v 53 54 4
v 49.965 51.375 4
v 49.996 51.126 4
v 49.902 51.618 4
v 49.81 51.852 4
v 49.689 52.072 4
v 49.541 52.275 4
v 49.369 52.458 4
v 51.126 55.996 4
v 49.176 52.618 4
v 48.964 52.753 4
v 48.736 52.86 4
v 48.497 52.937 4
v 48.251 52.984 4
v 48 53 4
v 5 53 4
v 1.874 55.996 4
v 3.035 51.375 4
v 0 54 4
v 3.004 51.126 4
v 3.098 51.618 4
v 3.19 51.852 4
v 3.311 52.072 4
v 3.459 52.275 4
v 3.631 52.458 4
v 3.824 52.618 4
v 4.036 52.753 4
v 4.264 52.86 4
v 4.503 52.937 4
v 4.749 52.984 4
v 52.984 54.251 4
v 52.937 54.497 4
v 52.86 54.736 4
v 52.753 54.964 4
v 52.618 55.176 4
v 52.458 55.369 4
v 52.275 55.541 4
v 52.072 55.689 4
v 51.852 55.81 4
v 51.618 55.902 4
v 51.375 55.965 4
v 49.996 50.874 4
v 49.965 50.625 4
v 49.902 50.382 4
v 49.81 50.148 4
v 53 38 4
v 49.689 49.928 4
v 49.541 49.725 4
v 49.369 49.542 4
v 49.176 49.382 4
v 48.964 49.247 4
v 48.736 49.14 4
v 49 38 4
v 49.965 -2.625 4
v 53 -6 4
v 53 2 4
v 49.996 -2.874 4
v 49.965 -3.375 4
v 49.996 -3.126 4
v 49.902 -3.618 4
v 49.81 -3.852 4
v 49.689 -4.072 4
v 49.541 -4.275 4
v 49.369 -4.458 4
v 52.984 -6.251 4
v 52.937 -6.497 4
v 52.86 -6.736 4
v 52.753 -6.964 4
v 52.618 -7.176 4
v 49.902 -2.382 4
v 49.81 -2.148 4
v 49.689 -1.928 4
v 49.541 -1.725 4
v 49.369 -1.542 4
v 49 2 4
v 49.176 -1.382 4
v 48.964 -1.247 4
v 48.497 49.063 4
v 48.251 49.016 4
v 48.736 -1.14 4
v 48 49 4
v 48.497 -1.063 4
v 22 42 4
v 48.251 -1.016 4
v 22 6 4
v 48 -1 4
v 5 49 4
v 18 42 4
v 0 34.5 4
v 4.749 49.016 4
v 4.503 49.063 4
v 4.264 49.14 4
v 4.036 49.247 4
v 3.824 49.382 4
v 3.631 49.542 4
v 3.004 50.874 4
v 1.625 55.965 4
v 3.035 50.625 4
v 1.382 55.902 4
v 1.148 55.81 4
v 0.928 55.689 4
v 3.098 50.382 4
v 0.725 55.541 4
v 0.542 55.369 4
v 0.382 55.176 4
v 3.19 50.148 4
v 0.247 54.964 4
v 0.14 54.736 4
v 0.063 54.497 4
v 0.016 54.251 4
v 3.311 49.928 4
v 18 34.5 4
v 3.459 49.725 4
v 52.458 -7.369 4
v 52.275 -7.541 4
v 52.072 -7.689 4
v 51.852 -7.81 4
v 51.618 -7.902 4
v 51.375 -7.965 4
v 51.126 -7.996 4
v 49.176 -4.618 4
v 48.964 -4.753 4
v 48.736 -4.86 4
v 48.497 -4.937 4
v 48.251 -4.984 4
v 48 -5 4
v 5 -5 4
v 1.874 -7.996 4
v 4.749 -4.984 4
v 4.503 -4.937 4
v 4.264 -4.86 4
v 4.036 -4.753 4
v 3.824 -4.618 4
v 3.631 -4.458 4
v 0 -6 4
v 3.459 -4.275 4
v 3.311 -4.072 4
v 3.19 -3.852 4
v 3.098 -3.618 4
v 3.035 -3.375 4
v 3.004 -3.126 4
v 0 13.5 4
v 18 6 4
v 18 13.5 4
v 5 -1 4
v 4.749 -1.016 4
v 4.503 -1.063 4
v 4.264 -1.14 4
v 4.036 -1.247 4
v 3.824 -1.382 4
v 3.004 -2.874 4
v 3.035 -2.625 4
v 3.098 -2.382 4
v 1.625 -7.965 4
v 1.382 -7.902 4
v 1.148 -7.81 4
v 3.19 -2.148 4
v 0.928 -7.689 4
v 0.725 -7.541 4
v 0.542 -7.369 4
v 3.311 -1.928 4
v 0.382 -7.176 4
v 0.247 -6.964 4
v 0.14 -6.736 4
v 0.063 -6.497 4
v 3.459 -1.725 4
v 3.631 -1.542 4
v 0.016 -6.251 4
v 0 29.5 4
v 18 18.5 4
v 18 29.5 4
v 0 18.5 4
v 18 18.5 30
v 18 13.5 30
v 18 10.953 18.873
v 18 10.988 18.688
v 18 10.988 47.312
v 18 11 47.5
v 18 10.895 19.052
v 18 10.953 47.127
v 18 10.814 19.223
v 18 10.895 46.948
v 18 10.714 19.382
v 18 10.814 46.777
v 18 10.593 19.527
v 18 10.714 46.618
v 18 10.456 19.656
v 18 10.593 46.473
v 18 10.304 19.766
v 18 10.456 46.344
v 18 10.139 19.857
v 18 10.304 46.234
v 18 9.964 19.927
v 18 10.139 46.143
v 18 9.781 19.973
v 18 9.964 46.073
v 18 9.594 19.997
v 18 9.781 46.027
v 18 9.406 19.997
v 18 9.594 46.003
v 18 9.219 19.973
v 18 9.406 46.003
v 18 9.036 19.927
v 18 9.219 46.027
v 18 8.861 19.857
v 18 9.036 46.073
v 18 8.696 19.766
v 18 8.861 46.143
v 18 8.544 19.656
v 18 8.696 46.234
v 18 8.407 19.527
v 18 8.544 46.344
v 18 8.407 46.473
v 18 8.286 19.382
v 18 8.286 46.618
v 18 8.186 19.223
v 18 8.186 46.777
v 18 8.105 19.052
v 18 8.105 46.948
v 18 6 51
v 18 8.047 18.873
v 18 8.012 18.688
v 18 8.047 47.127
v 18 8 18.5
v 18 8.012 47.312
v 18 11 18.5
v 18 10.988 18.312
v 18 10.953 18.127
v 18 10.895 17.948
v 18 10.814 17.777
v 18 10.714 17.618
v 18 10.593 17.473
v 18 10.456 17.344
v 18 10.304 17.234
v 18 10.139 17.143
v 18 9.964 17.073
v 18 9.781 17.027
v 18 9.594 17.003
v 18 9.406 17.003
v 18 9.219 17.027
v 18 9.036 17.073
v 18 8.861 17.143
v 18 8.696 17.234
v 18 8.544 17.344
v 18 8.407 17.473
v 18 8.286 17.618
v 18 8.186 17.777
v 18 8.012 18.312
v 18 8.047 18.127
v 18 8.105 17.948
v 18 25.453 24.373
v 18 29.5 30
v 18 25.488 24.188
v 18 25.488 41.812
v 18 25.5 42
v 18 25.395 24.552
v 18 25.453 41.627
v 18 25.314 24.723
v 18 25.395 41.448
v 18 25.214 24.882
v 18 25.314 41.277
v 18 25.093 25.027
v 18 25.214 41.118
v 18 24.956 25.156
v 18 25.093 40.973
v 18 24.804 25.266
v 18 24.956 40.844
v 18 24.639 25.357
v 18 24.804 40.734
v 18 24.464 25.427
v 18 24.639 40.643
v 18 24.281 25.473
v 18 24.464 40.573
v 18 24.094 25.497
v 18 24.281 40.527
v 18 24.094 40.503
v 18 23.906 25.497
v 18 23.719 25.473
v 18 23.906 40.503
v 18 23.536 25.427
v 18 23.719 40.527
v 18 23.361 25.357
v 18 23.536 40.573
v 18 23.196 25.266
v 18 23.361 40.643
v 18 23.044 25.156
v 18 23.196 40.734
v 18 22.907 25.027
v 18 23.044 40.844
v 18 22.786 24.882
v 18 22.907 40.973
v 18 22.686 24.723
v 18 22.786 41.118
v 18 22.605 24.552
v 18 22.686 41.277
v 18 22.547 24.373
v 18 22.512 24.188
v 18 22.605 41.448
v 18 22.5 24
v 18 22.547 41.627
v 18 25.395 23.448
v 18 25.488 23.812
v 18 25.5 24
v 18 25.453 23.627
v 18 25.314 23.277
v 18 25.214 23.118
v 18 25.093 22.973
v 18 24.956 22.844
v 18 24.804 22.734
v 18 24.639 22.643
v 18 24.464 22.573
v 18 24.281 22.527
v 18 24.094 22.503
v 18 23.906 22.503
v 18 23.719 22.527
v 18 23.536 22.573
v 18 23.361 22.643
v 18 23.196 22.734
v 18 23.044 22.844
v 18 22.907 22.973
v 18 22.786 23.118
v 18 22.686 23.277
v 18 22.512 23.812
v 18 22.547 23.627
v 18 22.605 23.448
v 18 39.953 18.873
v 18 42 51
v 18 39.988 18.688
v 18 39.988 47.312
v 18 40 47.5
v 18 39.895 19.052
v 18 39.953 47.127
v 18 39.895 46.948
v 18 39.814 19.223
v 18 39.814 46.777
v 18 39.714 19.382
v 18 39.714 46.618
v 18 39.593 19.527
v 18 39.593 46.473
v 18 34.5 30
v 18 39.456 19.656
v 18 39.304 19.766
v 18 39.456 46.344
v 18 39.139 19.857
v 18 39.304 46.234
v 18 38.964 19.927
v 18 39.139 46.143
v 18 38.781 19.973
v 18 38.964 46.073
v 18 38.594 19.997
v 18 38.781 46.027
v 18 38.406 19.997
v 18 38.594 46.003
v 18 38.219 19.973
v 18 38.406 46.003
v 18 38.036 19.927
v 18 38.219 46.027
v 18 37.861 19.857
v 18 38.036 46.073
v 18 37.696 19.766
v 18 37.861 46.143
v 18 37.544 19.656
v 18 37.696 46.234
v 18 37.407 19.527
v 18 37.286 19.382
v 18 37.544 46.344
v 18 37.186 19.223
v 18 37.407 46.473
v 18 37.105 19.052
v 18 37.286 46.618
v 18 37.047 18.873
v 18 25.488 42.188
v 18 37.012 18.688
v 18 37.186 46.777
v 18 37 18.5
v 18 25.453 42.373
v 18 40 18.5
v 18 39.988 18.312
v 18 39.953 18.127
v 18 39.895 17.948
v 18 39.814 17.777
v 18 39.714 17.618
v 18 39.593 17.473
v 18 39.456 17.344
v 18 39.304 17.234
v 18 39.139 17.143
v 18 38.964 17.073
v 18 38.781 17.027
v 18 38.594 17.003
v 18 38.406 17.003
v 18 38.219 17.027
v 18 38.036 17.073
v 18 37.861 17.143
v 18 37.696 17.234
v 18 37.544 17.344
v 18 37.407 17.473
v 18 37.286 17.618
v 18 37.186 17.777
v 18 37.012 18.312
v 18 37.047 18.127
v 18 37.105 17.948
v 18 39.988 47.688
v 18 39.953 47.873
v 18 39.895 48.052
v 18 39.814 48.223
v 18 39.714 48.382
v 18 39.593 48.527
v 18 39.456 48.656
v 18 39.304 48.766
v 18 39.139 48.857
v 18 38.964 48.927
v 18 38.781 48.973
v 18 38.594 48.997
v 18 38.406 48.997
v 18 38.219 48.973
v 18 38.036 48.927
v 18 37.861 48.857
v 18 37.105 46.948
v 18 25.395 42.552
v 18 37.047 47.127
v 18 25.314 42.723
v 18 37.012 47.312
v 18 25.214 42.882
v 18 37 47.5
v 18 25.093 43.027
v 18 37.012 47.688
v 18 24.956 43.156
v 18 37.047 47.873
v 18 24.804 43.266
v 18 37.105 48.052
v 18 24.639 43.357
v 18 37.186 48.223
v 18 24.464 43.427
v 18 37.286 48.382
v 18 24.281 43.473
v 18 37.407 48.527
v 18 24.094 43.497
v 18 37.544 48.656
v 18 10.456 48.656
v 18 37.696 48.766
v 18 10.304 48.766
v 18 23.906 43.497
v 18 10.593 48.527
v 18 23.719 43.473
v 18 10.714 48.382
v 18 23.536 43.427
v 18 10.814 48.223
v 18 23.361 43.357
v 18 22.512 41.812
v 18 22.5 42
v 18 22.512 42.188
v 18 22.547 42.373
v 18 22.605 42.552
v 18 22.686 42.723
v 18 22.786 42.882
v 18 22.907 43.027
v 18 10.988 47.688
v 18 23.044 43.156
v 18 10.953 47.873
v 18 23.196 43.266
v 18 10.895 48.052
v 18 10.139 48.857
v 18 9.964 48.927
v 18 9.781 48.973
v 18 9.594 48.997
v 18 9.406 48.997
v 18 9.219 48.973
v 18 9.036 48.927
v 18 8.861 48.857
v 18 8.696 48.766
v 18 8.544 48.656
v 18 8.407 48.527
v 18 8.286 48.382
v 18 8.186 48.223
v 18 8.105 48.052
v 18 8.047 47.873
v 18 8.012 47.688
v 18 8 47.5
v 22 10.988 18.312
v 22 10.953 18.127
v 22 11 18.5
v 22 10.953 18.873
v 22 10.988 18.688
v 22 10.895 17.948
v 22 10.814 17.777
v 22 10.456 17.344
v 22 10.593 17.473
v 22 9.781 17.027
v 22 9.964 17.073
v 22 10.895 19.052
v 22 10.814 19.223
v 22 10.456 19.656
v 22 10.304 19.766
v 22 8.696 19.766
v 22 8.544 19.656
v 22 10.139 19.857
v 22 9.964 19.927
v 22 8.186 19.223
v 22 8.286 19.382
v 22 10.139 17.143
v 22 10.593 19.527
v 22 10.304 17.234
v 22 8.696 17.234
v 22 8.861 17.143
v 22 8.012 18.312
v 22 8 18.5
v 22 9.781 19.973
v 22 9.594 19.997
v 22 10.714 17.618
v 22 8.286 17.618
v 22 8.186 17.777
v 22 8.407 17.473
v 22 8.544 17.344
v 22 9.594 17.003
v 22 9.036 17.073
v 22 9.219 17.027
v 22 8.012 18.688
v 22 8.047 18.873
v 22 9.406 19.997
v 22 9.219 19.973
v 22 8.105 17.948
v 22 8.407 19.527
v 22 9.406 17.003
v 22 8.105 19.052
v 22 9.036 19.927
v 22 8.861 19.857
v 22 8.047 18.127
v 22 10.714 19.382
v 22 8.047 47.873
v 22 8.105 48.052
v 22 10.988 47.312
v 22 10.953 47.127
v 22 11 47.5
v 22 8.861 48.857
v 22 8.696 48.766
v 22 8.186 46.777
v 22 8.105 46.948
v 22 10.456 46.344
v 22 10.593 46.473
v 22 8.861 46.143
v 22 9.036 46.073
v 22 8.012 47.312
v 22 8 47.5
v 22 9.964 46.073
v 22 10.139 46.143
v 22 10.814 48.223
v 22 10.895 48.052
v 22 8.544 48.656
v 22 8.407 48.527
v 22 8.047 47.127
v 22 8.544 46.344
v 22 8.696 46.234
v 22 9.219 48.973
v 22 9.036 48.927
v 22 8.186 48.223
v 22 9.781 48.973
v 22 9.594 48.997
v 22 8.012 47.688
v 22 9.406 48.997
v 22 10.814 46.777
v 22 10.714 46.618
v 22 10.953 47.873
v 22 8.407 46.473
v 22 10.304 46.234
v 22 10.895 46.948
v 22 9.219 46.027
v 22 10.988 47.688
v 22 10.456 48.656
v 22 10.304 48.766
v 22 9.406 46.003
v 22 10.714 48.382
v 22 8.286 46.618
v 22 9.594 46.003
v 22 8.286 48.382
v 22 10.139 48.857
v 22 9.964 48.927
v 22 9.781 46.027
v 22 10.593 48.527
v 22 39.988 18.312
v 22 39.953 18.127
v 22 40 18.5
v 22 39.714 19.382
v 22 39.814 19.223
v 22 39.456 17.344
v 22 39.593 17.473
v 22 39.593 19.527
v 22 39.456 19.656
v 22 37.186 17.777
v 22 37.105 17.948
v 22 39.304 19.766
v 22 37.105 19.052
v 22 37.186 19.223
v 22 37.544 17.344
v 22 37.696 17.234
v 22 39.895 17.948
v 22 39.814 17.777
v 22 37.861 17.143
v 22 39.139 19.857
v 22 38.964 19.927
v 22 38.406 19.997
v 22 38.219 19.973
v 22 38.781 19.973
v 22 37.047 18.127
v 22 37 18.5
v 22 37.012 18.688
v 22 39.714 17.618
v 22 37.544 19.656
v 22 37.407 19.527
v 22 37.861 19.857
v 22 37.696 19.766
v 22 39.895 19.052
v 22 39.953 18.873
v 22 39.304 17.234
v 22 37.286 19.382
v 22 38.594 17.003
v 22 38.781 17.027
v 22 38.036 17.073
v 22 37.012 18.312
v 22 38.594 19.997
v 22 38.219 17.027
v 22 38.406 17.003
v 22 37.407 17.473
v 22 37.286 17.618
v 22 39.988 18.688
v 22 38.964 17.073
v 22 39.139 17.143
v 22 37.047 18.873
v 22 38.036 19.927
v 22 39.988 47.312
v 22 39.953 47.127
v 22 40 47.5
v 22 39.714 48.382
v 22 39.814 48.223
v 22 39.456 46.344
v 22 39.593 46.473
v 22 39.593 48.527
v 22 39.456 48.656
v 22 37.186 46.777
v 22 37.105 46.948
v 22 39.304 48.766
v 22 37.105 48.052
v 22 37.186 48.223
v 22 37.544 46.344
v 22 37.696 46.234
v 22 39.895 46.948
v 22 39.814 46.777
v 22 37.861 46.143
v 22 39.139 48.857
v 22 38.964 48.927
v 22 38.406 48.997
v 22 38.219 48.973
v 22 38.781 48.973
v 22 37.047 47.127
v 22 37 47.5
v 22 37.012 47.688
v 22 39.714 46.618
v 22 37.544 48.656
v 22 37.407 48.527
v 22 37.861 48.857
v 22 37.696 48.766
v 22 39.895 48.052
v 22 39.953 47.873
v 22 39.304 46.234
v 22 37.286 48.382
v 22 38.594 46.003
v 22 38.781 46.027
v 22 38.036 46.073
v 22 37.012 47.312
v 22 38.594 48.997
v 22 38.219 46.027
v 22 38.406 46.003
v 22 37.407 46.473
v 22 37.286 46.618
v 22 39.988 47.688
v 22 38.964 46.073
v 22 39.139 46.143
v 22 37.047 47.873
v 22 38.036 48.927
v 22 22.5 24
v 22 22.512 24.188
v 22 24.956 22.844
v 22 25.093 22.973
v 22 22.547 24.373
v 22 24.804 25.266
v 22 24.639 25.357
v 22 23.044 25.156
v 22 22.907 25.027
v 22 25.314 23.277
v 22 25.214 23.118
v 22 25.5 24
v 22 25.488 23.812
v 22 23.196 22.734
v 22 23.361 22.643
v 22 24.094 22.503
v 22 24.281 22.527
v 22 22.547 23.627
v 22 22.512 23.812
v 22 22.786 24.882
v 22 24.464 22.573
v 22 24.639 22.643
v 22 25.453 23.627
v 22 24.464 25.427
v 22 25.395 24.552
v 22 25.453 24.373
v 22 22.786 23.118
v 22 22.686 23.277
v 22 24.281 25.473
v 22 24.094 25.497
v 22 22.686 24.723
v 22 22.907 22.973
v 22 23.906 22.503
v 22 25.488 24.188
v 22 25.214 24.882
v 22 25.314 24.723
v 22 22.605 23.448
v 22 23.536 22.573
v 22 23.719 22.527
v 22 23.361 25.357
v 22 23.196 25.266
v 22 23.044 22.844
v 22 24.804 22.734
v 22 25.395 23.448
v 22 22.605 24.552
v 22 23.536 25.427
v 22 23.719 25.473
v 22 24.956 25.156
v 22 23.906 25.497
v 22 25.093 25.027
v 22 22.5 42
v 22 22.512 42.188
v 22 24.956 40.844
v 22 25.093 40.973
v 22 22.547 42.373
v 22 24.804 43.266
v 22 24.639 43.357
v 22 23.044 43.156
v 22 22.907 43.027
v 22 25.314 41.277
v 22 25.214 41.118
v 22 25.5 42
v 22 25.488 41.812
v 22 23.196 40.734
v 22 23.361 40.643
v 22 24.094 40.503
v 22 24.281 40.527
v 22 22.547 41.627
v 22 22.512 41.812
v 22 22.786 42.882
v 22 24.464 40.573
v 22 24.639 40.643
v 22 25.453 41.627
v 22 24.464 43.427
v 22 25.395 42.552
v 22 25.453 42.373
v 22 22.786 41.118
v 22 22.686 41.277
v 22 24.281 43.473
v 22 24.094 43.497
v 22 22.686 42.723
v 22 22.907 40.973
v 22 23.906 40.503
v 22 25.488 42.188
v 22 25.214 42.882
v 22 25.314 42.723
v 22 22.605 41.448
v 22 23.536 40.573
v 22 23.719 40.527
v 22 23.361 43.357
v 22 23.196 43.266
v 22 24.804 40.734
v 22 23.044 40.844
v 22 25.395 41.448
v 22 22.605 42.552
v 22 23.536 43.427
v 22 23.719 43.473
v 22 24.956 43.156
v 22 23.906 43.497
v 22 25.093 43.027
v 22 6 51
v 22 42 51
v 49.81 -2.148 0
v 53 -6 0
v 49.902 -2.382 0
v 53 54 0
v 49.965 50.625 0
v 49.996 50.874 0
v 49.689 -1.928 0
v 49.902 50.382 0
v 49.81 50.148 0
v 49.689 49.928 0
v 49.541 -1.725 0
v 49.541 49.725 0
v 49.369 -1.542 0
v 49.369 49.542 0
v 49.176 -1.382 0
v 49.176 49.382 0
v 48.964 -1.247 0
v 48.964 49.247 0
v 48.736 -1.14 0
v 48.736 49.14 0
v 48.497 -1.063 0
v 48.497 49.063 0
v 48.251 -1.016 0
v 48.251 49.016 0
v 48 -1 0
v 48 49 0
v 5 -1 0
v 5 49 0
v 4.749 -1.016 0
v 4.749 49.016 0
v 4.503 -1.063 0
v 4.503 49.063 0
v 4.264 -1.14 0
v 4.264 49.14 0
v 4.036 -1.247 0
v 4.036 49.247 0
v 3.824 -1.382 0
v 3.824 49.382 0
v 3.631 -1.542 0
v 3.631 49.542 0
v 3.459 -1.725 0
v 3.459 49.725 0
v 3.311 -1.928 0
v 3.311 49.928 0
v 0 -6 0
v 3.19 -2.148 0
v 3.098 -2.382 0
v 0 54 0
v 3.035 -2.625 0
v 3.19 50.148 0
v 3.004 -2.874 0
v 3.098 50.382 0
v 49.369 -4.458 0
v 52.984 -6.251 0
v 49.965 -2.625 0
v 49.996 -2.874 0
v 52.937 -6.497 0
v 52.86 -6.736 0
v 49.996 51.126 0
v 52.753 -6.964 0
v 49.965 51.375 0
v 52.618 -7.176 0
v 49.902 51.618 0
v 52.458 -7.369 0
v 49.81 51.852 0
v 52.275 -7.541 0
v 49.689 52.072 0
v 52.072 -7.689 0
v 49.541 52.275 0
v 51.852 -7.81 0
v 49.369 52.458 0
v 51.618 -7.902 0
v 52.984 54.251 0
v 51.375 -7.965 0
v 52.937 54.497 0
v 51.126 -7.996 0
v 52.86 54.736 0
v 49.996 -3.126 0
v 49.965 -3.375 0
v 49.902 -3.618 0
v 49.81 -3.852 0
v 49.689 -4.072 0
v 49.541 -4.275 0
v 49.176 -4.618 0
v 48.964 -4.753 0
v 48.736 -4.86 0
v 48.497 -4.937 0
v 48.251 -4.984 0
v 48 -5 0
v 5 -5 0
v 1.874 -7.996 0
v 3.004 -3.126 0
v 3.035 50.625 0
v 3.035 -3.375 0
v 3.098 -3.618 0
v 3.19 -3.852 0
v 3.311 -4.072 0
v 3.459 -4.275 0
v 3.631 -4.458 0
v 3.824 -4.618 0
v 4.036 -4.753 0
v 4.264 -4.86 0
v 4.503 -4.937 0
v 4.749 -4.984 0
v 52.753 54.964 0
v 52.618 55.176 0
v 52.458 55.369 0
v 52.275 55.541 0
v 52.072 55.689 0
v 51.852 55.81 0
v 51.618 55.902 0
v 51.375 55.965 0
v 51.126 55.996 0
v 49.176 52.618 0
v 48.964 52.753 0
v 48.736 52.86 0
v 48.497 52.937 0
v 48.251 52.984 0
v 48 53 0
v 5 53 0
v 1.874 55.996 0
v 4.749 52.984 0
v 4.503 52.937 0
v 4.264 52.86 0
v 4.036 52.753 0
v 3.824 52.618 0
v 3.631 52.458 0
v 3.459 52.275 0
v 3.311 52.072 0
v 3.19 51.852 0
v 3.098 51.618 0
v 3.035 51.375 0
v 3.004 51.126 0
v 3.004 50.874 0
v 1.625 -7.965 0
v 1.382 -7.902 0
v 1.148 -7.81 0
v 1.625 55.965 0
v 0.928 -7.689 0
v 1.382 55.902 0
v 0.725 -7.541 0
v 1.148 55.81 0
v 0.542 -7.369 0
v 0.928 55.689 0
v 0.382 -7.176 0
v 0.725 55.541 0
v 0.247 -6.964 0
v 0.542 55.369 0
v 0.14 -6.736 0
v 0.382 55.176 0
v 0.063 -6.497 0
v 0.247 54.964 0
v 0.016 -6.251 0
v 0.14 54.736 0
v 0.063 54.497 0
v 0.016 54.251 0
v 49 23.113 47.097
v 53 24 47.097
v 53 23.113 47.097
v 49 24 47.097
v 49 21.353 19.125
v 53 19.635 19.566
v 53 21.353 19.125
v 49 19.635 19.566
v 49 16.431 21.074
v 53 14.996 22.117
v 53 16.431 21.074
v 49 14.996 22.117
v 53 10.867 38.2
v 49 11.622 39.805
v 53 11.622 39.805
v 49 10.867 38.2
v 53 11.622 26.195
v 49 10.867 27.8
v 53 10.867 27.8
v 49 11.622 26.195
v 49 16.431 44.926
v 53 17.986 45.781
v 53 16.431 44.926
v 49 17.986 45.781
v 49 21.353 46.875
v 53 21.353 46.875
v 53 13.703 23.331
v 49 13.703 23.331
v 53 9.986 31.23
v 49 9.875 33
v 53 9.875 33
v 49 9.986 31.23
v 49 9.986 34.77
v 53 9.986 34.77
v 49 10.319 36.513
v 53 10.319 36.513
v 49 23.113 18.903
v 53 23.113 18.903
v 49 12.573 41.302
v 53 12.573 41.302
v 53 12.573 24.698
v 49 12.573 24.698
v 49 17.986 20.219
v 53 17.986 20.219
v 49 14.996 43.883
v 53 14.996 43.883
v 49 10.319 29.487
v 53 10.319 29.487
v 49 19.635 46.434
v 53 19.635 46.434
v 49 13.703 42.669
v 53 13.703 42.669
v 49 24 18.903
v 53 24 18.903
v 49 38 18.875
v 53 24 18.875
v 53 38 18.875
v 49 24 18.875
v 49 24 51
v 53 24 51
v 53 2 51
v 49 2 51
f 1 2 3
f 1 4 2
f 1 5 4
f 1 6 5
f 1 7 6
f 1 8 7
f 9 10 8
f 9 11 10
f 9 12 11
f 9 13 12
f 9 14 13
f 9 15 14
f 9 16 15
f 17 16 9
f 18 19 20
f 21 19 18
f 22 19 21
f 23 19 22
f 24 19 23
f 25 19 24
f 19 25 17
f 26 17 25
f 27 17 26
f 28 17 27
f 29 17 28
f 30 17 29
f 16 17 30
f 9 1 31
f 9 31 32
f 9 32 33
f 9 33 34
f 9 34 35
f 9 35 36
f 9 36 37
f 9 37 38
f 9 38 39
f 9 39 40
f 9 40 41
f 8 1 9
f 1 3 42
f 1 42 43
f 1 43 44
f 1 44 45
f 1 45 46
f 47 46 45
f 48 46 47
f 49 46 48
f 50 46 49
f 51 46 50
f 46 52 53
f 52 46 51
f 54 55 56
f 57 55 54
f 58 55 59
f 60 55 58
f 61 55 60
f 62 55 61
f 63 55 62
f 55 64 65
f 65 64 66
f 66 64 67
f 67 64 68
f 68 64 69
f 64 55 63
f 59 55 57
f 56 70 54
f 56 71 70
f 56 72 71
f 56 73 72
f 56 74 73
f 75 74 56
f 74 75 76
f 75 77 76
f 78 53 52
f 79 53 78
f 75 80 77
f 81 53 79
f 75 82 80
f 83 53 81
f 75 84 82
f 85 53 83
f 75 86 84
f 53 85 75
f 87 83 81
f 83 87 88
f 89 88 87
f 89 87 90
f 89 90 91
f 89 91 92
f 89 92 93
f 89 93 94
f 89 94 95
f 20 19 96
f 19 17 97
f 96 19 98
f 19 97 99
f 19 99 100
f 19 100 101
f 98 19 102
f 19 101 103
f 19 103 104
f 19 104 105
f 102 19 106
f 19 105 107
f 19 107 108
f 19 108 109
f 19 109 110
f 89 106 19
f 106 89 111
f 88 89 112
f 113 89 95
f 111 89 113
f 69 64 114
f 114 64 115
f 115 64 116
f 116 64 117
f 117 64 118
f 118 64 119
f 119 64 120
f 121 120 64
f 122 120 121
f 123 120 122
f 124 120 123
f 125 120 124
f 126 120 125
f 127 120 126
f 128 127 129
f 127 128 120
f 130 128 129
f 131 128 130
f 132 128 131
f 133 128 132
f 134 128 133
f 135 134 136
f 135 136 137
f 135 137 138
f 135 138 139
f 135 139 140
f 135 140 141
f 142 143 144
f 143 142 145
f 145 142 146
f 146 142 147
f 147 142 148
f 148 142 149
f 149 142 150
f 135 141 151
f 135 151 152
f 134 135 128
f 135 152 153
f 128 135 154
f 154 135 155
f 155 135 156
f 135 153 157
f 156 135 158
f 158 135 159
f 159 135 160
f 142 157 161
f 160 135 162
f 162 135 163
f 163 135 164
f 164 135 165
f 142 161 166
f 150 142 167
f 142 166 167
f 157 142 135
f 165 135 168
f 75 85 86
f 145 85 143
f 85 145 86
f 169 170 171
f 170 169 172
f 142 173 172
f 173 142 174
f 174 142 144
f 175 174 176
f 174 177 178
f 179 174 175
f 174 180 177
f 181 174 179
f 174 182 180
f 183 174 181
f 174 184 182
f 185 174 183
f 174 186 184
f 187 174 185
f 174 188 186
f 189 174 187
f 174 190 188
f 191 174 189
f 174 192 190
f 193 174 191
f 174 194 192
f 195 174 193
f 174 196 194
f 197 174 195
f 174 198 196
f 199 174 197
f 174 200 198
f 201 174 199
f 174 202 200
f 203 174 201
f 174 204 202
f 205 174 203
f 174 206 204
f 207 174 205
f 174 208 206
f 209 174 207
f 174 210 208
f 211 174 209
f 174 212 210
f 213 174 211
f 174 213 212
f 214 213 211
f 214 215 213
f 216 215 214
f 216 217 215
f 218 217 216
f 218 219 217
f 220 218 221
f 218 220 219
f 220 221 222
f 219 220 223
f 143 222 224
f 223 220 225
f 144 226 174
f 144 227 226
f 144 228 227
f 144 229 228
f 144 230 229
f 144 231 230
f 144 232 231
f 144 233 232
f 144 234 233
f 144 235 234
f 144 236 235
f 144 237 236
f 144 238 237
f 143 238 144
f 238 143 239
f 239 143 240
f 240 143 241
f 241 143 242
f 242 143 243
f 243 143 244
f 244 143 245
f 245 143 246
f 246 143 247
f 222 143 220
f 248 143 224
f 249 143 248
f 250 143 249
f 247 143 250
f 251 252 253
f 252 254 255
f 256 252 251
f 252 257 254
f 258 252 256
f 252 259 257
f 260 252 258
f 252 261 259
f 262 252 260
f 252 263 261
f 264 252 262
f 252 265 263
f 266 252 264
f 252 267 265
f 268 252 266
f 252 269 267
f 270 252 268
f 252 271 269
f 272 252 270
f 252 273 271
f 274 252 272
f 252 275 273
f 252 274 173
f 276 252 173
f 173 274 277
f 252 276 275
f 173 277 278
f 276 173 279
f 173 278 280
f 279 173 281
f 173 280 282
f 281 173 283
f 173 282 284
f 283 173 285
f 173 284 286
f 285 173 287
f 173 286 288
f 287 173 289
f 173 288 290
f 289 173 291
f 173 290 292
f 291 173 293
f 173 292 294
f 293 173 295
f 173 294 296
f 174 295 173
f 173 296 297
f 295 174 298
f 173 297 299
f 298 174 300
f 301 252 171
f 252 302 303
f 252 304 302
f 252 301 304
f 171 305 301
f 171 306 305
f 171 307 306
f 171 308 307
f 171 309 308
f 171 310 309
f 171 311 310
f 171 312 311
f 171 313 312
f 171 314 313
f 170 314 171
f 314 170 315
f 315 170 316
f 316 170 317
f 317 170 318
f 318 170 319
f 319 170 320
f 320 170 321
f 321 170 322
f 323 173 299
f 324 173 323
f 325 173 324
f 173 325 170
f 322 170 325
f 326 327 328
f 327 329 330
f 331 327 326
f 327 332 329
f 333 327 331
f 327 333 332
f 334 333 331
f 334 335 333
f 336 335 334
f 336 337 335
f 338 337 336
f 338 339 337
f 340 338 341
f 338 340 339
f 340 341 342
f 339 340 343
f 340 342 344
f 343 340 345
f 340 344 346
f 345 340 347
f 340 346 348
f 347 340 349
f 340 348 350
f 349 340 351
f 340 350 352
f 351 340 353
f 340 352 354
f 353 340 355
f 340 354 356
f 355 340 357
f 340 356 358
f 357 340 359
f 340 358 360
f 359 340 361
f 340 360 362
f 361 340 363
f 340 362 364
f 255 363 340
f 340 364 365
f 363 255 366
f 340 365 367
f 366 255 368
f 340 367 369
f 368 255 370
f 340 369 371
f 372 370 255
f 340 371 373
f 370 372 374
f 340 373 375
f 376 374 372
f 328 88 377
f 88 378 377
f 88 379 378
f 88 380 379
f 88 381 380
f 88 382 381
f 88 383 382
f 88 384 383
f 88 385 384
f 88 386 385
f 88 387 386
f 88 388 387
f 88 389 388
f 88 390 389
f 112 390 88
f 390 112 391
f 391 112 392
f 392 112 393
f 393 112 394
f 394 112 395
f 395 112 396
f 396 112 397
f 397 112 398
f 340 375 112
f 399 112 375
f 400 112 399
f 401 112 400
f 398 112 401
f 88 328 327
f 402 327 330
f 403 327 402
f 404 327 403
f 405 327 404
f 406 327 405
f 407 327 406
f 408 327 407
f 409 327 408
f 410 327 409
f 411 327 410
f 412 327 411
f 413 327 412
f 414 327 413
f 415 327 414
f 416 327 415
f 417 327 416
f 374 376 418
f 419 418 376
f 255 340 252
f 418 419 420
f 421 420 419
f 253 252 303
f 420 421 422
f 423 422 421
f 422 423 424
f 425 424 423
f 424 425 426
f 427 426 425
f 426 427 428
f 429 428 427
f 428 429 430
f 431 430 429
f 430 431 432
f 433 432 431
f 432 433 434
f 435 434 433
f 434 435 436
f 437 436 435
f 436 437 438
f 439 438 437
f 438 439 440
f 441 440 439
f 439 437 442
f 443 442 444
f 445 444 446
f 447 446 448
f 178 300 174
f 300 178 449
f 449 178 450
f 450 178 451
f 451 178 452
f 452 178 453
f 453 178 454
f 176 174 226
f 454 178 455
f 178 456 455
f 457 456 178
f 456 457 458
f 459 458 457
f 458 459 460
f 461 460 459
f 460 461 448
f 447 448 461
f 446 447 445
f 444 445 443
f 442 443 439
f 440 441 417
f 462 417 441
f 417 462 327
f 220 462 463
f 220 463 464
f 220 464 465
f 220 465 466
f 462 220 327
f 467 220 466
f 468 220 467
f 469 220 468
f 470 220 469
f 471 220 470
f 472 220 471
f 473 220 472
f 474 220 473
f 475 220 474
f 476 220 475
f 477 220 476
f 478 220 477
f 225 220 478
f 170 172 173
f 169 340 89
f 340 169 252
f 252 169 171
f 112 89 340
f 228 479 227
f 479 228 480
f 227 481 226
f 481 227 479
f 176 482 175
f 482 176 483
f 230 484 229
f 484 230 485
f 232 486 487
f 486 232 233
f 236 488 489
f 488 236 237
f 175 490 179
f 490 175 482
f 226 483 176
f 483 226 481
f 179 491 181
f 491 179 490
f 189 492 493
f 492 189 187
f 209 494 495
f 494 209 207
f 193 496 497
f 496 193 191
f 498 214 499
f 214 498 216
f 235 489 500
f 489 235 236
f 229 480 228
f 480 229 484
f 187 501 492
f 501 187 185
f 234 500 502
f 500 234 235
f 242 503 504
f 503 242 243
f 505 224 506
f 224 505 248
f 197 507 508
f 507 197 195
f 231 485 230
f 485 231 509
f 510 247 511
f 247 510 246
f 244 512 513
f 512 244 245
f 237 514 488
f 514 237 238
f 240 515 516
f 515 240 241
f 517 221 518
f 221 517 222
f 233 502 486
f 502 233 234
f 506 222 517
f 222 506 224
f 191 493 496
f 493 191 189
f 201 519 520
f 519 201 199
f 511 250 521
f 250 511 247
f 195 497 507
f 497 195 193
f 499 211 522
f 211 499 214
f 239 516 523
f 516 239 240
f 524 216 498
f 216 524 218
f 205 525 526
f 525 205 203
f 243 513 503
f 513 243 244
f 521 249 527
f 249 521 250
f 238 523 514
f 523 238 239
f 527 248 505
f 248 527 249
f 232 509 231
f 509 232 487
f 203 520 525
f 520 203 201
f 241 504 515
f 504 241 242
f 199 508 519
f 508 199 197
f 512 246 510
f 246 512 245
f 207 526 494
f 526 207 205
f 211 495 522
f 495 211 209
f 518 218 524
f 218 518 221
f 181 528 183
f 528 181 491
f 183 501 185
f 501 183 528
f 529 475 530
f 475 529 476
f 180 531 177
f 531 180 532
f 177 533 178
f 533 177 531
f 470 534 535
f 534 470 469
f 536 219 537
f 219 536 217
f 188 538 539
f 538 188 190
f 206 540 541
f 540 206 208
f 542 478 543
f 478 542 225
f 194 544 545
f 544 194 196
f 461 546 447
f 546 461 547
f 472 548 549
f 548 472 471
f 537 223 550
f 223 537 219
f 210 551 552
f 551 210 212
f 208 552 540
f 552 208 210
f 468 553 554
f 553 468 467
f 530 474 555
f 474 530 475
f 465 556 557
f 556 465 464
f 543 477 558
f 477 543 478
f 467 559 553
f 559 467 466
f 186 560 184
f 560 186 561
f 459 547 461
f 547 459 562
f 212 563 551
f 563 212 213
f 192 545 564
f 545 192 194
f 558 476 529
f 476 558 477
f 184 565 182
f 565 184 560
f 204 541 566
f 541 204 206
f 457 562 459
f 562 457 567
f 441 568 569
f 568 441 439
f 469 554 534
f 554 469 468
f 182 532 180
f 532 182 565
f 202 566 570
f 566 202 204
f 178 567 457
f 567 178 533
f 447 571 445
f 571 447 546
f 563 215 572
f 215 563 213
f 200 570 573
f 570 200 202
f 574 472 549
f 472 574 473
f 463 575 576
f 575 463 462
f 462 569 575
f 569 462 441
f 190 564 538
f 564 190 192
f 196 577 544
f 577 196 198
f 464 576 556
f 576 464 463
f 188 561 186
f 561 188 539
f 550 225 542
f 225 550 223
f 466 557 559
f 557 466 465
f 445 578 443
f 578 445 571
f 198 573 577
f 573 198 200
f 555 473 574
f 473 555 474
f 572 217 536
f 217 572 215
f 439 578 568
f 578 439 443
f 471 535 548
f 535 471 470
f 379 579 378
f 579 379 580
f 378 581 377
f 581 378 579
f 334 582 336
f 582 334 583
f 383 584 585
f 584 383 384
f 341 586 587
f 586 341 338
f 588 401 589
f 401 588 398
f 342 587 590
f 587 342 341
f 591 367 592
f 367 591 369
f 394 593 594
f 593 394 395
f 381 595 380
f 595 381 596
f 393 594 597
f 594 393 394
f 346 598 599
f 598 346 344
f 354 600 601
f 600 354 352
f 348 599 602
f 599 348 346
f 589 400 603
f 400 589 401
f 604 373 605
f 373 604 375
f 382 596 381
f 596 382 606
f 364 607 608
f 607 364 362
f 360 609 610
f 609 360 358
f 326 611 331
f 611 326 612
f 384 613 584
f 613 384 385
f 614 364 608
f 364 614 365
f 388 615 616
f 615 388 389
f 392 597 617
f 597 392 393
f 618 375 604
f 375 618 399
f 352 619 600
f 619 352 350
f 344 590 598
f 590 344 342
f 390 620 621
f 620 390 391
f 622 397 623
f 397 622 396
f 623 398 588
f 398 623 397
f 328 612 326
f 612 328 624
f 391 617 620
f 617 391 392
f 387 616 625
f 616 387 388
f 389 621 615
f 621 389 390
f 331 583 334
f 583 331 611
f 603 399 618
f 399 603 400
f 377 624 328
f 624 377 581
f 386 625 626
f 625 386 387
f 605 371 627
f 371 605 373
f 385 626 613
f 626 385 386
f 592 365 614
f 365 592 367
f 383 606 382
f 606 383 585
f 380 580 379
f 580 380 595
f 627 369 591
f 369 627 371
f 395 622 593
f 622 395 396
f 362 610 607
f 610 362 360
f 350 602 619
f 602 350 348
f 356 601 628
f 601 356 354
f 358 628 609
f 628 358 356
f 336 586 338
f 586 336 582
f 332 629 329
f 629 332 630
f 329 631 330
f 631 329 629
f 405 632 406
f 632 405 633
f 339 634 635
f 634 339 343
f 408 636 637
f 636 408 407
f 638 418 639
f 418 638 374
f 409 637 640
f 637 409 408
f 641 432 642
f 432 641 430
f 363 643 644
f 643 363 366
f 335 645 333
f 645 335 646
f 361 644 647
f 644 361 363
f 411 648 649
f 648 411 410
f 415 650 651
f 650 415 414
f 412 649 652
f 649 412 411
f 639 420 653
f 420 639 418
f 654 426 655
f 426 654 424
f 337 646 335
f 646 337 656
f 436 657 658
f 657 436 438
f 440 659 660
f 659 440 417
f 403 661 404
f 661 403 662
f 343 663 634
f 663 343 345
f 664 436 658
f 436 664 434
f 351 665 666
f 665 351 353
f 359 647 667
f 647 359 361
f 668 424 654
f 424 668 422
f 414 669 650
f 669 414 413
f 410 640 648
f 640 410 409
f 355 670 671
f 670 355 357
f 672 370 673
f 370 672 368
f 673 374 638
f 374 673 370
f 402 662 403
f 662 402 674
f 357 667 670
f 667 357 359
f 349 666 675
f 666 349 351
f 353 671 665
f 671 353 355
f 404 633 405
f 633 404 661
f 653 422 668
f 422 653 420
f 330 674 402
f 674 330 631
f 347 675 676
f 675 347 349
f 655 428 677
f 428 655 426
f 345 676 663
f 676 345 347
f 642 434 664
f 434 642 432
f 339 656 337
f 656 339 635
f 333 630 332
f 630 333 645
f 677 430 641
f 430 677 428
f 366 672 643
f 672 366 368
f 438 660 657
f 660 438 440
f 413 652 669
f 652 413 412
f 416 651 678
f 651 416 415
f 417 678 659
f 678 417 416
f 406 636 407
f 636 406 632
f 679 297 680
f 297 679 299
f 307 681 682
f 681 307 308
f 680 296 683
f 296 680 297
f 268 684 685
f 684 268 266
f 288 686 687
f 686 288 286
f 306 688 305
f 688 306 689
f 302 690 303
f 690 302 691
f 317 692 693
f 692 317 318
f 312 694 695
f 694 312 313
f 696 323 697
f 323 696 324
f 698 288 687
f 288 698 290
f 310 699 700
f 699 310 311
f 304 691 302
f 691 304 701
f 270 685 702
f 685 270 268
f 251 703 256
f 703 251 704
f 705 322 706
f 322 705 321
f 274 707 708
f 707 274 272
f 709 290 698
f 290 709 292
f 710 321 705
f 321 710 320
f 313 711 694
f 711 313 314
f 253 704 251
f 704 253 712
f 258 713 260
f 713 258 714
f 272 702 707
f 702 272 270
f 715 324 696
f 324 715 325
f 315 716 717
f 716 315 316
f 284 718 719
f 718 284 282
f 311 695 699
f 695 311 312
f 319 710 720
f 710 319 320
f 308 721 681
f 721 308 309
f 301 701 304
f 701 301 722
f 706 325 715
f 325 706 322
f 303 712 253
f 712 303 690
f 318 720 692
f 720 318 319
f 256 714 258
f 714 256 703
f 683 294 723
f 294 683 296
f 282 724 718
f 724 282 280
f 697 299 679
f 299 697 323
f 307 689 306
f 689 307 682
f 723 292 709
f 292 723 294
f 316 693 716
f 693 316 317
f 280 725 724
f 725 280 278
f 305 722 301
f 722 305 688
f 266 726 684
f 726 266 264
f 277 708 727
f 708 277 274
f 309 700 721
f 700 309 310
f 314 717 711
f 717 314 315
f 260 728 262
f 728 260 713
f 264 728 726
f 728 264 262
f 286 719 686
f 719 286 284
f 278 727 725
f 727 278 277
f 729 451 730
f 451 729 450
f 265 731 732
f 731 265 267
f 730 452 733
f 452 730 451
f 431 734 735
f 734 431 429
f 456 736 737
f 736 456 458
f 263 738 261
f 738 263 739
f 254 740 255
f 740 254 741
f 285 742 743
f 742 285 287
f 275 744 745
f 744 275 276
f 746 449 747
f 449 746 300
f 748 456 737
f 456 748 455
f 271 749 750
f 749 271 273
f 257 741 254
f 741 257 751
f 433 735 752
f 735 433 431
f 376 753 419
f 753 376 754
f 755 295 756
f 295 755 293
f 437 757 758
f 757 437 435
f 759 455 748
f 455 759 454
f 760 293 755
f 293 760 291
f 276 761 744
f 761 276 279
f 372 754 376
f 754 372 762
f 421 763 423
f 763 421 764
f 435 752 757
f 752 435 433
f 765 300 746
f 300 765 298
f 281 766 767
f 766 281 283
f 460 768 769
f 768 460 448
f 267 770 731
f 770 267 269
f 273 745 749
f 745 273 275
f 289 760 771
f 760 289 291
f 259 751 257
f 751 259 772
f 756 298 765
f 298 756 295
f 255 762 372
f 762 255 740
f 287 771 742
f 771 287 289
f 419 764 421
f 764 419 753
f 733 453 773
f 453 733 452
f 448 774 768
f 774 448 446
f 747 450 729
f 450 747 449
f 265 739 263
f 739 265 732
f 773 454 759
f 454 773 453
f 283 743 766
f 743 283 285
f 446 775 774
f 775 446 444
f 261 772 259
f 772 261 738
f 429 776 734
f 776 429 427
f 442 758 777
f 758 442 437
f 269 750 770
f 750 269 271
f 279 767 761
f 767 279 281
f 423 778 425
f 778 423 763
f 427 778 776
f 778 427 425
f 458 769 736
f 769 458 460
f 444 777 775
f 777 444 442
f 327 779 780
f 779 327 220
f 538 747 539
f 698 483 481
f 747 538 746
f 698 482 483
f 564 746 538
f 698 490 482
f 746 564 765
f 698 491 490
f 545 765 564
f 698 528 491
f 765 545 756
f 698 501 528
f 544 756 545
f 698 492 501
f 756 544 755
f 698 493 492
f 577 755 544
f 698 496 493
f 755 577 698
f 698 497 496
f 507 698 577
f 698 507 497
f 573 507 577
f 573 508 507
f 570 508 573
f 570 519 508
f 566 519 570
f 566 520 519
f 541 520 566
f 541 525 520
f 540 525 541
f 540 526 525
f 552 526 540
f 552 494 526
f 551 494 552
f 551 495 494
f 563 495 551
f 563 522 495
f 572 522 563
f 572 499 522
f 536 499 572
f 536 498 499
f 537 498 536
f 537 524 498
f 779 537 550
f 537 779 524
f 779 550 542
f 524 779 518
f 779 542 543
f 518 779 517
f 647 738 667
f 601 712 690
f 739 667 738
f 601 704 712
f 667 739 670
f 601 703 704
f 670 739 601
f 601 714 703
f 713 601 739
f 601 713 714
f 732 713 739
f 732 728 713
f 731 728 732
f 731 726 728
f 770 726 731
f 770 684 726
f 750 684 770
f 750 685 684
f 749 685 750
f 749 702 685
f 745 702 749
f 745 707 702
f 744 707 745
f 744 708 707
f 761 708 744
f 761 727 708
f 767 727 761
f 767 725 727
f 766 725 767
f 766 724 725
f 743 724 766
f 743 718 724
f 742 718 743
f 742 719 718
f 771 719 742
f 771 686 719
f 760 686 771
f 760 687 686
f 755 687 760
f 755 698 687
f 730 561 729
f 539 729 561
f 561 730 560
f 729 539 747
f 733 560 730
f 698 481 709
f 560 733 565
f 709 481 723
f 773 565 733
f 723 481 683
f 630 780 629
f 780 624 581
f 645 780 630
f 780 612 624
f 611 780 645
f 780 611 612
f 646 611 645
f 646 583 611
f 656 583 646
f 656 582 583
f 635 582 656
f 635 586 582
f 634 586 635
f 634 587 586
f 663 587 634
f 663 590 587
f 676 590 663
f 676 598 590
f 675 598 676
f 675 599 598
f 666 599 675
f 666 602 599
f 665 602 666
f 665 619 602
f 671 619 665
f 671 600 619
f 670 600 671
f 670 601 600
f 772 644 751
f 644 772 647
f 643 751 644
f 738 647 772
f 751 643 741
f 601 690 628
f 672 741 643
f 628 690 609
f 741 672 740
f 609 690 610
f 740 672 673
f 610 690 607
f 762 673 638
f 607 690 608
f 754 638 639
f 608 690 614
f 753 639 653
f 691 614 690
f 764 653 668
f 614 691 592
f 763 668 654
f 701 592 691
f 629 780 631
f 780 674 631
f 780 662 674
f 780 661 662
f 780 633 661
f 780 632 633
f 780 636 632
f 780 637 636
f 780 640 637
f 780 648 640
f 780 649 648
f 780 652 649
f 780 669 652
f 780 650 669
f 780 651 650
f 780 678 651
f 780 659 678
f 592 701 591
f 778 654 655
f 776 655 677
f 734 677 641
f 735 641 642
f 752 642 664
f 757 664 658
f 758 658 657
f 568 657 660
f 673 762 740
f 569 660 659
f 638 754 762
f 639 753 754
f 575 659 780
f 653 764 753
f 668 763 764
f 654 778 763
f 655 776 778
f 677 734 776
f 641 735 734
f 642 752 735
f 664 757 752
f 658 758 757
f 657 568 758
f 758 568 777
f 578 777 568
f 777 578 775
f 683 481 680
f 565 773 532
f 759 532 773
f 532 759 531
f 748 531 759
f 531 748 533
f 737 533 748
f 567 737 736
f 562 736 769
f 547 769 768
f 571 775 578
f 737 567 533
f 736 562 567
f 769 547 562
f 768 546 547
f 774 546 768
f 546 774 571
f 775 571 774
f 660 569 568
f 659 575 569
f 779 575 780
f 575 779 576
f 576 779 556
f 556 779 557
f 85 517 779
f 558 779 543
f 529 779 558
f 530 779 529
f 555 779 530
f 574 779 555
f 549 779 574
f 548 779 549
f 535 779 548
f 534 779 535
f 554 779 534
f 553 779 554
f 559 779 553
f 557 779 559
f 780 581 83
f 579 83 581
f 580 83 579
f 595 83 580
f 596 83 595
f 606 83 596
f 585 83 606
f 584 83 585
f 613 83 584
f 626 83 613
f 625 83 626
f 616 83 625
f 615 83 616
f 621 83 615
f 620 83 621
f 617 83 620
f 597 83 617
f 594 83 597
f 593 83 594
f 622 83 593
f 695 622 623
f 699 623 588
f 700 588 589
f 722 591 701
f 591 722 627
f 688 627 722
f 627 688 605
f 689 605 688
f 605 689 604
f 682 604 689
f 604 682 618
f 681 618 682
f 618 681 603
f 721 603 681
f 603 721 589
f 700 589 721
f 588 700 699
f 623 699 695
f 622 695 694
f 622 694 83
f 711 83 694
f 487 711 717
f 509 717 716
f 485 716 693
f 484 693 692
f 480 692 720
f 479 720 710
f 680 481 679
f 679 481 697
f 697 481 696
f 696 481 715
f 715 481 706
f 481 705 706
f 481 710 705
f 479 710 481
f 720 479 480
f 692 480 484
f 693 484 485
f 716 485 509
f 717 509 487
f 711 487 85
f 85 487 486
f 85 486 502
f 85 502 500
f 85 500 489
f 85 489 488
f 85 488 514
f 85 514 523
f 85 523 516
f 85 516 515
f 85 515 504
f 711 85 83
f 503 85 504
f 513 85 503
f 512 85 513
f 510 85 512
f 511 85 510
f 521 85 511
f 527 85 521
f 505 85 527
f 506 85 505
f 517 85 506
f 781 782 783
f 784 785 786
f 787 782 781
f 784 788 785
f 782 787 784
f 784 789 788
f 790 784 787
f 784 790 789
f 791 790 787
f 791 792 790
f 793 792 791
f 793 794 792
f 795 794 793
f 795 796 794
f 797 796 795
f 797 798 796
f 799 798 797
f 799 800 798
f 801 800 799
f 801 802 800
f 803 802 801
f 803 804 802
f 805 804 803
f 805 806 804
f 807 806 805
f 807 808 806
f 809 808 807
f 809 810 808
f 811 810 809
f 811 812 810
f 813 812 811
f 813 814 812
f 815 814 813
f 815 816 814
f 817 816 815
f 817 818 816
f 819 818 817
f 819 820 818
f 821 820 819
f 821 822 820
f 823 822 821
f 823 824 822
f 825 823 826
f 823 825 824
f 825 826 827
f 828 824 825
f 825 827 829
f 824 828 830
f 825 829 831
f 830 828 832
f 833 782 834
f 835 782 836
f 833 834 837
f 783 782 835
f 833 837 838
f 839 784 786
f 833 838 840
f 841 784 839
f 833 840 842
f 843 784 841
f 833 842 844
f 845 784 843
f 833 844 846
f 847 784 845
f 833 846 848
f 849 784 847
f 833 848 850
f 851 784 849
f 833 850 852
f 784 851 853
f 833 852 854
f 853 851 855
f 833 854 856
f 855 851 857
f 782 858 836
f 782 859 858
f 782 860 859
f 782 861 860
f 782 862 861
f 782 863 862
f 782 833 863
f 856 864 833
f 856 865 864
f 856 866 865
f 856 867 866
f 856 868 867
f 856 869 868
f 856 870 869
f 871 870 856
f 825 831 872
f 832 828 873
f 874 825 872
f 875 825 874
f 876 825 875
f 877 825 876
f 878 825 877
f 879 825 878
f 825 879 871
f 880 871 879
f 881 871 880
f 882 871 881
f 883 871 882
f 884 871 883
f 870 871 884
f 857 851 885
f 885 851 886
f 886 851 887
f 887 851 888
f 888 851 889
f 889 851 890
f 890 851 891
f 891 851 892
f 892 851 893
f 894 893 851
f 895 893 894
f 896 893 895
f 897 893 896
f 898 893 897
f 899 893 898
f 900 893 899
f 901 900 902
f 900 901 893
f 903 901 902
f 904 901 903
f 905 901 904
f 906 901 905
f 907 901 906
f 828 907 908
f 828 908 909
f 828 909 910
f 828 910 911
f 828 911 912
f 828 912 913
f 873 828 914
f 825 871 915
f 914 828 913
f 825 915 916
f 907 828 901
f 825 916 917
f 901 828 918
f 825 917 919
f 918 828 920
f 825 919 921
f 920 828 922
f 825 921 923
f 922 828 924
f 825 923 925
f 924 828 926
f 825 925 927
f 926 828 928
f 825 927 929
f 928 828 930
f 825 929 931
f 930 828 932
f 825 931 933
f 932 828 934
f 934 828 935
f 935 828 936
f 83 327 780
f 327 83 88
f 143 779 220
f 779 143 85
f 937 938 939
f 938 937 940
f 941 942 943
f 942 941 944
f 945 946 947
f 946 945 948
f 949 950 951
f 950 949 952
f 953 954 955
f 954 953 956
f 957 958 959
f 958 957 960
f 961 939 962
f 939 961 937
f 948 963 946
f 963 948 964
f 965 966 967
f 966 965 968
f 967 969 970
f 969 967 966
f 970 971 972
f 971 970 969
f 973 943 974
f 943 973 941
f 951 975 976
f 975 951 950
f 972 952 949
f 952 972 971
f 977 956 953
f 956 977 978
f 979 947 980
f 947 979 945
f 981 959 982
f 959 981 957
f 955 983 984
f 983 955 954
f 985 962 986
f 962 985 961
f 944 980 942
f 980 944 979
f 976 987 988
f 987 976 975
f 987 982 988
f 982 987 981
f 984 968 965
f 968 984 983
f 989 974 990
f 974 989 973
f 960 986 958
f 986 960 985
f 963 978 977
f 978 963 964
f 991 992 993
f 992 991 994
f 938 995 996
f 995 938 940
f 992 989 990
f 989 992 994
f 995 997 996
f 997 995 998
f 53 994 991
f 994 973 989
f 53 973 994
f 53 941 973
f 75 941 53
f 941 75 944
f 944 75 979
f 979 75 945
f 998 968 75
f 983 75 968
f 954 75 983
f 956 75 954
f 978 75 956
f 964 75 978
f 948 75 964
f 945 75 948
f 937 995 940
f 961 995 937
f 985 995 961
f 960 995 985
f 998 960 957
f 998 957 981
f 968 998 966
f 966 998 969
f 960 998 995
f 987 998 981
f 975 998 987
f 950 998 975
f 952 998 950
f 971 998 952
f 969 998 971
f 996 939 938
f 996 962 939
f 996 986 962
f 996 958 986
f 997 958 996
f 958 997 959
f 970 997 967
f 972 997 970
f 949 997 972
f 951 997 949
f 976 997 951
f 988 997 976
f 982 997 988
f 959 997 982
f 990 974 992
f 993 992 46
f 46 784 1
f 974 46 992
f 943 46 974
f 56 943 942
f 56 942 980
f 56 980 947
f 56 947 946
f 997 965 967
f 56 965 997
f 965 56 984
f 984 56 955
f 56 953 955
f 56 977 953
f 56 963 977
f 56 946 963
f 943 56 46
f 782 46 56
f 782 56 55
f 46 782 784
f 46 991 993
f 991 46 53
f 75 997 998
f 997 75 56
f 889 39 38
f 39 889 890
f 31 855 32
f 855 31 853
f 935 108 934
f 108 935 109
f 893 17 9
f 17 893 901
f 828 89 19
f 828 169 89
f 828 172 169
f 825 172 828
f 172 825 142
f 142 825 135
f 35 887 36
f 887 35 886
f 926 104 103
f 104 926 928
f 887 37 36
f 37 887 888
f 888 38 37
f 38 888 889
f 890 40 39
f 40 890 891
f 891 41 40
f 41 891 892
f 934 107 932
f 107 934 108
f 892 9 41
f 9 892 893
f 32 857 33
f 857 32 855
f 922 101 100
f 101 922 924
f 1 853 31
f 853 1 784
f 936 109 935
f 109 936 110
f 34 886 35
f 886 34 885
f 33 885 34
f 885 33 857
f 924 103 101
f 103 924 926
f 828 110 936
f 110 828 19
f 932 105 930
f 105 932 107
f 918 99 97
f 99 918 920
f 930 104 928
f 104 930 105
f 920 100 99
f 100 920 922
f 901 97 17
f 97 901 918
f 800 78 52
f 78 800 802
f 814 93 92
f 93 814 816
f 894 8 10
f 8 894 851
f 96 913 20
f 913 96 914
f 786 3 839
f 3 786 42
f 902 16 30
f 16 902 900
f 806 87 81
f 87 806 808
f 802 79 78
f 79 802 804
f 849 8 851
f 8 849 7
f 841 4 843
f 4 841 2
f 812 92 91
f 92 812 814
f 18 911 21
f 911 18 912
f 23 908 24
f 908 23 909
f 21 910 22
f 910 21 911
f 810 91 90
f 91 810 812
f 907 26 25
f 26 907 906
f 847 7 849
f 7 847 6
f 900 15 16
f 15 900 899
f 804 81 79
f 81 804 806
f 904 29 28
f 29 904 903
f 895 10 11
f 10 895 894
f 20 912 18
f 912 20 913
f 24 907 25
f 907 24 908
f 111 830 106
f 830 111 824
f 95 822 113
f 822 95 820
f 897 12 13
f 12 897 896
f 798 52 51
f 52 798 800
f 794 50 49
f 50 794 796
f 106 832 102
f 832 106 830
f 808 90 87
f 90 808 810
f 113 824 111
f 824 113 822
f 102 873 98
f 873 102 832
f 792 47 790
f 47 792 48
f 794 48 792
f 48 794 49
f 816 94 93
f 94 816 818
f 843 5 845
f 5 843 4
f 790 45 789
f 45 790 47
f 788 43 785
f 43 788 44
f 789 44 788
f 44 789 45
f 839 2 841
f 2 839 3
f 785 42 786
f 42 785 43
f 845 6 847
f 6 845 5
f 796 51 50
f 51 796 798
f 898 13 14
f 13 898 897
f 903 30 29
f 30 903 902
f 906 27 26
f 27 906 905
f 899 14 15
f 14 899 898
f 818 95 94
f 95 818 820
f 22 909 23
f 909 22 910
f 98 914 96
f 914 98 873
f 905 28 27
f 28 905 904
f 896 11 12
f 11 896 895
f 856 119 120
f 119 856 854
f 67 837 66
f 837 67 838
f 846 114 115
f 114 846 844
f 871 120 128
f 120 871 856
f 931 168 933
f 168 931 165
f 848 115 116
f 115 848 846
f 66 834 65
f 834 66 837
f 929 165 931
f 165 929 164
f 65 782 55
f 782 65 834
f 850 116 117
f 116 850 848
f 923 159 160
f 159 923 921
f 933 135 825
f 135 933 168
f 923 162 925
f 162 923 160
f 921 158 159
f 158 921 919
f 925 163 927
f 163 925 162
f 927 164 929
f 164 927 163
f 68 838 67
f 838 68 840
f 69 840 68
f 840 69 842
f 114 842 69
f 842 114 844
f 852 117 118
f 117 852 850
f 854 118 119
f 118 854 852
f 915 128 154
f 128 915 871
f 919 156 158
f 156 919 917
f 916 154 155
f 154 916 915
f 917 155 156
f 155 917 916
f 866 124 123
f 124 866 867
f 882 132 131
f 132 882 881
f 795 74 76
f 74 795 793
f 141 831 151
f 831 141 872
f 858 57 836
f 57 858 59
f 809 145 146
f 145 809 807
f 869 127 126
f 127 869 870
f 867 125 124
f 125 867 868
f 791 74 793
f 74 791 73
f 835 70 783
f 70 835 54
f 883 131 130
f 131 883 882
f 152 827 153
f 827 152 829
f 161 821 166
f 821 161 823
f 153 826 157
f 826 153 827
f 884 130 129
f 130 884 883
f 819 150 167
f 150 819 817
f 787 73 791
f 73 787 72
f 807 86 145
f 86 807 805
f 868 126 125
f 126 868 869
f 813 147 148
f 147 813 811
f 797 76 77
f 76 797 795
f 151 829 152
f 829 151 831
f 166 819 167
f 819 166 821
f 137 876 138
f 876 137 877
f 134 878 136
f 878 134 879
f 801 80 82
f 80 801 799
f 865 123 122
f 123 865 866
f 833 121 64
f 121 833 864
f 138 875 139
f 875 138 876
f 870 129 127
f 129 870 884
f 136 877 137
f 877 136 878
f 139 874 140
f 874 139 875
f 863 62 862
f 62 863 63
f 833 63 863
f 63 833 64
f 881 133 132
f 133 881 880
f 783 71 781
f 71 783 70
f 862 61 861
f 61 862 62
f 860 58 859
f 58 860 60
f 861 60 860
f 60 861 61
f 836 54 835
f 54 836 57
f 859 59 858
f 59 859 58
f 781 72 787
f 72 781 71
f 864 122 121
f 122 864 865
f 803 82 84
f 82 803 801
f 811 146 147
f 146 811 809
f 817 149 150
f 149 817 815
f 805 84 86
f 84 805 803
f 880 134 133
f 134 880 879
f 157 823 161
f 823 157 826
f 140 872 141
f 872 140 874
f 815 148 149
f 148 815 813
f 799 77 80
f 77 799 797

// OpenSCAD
$fn=50;
THICKNESS = 4;

CAM_DISTANCE_FROM_BASE = 15;
CAM_WIDTH = 36;
CAM_HEIGHT = 36;
CAM_HOLE_SPACING = 29;
CAM_HOLE_D = 3;
CAM_HOLE_R = CAM_HOLE_D/2;
CAM_TOTAL_HEIGHT = CAM_DISTANCE_FROM_BASE + CAM_HEIGHT;
CAM_HOLE_OFFSET = (CAM_WIDTH - CAM_HOLE_SPACING)/2;

// The back of the Arducam has two screw heads sticking out.
// These screws hold the lens mount in place.
CAM_SCREW_HOLES_DISTANCE = 9;
CAM_SCREW_HOLES_R = 2;

BRACE_LENGTH = 18;
BRACE_HEIGHT = 26;
BRACE_THICKNESS = 5;
BRACE_OFFSET = 10;

LENS_CENTER_FROM_BASE = 33;
LENS_D = 28.25;
LENS_R = LENS_D/2;
DISTANCE_LENS = 27;
//LENS_BUFFER = 5;
//LENS_TOTAL_HEIGHT = LENS_CENTER_FROM_BASE + LENS_R + LENS_BUFFER;
LENS_SUPPORT_POSITION = BRACE_LENGTH + THICKNESS + DISTANCE_LENS;
LENS_SUPPORT_BUFFER = 4;
LENS_SUPPORT_CHOP = 10;

BASE_BUFFER = 6;
BASE_LENGTH = BRACE_LENGTH + THICKNESS + DISTANCE_LENS + THICKNESS;
BASE_WIDTH = CAM_WIDTH + BASE_BUFFER*2;

module prism(l, w, h){
   polyhedron(
       points=[[0,0,0], [l,0,0], [l,w,0], [0,w,0], [0,w,h], [l,w,h]],
       faces=[[0,1,2,3],[5,4,3,2],[0,4,5,1],[0,3,4],[5,2,1]]
    );   
}

module hole(r){
    rotate ([0,0,90]) {
        cylinder (h=10, r=r, center=true);
    }
}

// Base
cube([BASE_LENGTH, BASE_WIDTH, THICKNESS]);    

translate([ THICKNESS, BASE_BUFFER, 0 ]){
    // Braces
    rotate([0,0,-90]){
        translate([ 0, -THICKNESS, THICKNESS]){
            translate([ -BRACE_OFFSET - BRACE_THICKNESS/2, 0, 0])
            prism( BRACE_THICKNESS, BRACE_LENGTH, BRACE_HEIGHT );
        }

        translate([-CAM_WIDTH, -THICKNESS, THICKNESS]){
            translate([ BRACE_OFFSET - BRACE_THICKNESS/2, 0, 0])
            prism( BRACE_THICKNESS, BRACE_LENGTH, BRACE_HEIGHT );
        }
    }
    
    // Camera plate
    translate([BRACE_LENGTH, 0, 0]) {
        rotate([0,-90,0]){
            difference(){
                cube([CAM_TOTAL_HEIGHT, CAM_WIDTH, THICKNESS]);
                
                // Arducam mount holes
                translate([CAM_HOLE_OFFSET + CAM_DISTANCE_FROM_BASE, CAM_HOLE_OFFSET, 0]){
                    hole(CAM_HOLE_R);
                    
                    translate([CAM_HOLE_SPACING, 0, 0])
                    hole(CAM_HOLE_R);
                    
                    translate([0, CAM_HOLE_SPACING, 0])
                    hole(CAM_HOLE_R);

                    translate([CAM_HOLE_SPACING, CAM_HOLE_SPACING, 0])
                    hole(CAM_HOLE_R);
                }

                // Screw holes
                translate([CAM_DISTANCE_FROM_BASE, 0, 0]){
                    translate([CAM_SCREW_HOLES_DISTANCE, CAM_WIDTH/2, 0])
                    hole(CAM_HOLE_R);

                    translate([CAM_WIDTH-CAM_SCREW_HOLES_DISTANCE, CAM_WIDTH/2, 0])
                    hole(CAM_HOLE_R);
                }                
            }
        }
    }
    
    // Lens support
    translate([ LENS_SUPPORT_POSITION, -LENS_SUPPORT_BUFFER, 0]){
        rotate([0,-90,0]){
            difference(){
                cube([CAM_TOTAL_HEIGHT, CAM_WIDTH, THICKNESS]);
                
                translate([LENS_CENTER_FROM_BASE, CAM_HEIGHT/2 + LENS_SUPPORT_BUFFER, 0]){
                    hole(LENS_R);
                    translate([-LENS_R,0,-THICKNESS/2])
                    cube([LENS_D + LENS_SUPPORT_CHOP, LENS_D, THICKNESS*2]);
                }                
            }
        }
    }
}

SLOT_BLOCK_BUFFER = 3;
SLOT_LENGTH = BASE_LENGTH - (SLOT_BLOCK_BUFFER*2);
SLOT_HEIGHT = 4;
SLOT_BLOCK_POSITION = 0;
SLOT_BLOCK_LENGTH = SLOT_LENGTH + (SLOT_BLOCK_BUFFER*2);
SLOT_BLOCK_HEIGHT = SLOT_HEIGHT + (SLOT_BLOCK_BUFFER*2);
SLOT_ROUNDED_R = 2;

module slot() {
    translate([ SLOT_LENGTH/2+SLOT_BLOCK_BUFFER, SLOT_HEIGHT/2+SLOT_BLOCK_BUFFER, THICKNESS/2 ]) {
        difference() {
            minkowski() {
                cube([SLOT_BLOCK_LENGTH-(SLOT_ROUNDED_R*2), SLOT_BLOCK_HEIGHT-(SLOT_ROUNDED_R*2), THICKNESS/2], center=true);
                cylinder (h=THICKNESS/2, r=SLOT_ROUNDED_R, center=true);
            }
         
            hull() {
                translate([ -SLOT_LENGTH/2 + SLOT_HEIGHT/2, 0, 0 ])
                hole(SLOT_HEIGHT/2);

                translate([ SLOT_LENGTH/2 - SLOT_HEIGHT/2, 0, 0 ])
                hole(SLOT_HEIGHT/2);
            }    
        }
    }
}

translate([ SLOT_BLOCK_POSITION, BASE_WIDTH - SLOT_HEIGHT/2, 0 ])
slot();

translate([ SLOT_BLOCK_POSITION, -SLOT_BLOCK_HEIGHT + SLOT_HEIGHT/2, 0 ])
slot();
